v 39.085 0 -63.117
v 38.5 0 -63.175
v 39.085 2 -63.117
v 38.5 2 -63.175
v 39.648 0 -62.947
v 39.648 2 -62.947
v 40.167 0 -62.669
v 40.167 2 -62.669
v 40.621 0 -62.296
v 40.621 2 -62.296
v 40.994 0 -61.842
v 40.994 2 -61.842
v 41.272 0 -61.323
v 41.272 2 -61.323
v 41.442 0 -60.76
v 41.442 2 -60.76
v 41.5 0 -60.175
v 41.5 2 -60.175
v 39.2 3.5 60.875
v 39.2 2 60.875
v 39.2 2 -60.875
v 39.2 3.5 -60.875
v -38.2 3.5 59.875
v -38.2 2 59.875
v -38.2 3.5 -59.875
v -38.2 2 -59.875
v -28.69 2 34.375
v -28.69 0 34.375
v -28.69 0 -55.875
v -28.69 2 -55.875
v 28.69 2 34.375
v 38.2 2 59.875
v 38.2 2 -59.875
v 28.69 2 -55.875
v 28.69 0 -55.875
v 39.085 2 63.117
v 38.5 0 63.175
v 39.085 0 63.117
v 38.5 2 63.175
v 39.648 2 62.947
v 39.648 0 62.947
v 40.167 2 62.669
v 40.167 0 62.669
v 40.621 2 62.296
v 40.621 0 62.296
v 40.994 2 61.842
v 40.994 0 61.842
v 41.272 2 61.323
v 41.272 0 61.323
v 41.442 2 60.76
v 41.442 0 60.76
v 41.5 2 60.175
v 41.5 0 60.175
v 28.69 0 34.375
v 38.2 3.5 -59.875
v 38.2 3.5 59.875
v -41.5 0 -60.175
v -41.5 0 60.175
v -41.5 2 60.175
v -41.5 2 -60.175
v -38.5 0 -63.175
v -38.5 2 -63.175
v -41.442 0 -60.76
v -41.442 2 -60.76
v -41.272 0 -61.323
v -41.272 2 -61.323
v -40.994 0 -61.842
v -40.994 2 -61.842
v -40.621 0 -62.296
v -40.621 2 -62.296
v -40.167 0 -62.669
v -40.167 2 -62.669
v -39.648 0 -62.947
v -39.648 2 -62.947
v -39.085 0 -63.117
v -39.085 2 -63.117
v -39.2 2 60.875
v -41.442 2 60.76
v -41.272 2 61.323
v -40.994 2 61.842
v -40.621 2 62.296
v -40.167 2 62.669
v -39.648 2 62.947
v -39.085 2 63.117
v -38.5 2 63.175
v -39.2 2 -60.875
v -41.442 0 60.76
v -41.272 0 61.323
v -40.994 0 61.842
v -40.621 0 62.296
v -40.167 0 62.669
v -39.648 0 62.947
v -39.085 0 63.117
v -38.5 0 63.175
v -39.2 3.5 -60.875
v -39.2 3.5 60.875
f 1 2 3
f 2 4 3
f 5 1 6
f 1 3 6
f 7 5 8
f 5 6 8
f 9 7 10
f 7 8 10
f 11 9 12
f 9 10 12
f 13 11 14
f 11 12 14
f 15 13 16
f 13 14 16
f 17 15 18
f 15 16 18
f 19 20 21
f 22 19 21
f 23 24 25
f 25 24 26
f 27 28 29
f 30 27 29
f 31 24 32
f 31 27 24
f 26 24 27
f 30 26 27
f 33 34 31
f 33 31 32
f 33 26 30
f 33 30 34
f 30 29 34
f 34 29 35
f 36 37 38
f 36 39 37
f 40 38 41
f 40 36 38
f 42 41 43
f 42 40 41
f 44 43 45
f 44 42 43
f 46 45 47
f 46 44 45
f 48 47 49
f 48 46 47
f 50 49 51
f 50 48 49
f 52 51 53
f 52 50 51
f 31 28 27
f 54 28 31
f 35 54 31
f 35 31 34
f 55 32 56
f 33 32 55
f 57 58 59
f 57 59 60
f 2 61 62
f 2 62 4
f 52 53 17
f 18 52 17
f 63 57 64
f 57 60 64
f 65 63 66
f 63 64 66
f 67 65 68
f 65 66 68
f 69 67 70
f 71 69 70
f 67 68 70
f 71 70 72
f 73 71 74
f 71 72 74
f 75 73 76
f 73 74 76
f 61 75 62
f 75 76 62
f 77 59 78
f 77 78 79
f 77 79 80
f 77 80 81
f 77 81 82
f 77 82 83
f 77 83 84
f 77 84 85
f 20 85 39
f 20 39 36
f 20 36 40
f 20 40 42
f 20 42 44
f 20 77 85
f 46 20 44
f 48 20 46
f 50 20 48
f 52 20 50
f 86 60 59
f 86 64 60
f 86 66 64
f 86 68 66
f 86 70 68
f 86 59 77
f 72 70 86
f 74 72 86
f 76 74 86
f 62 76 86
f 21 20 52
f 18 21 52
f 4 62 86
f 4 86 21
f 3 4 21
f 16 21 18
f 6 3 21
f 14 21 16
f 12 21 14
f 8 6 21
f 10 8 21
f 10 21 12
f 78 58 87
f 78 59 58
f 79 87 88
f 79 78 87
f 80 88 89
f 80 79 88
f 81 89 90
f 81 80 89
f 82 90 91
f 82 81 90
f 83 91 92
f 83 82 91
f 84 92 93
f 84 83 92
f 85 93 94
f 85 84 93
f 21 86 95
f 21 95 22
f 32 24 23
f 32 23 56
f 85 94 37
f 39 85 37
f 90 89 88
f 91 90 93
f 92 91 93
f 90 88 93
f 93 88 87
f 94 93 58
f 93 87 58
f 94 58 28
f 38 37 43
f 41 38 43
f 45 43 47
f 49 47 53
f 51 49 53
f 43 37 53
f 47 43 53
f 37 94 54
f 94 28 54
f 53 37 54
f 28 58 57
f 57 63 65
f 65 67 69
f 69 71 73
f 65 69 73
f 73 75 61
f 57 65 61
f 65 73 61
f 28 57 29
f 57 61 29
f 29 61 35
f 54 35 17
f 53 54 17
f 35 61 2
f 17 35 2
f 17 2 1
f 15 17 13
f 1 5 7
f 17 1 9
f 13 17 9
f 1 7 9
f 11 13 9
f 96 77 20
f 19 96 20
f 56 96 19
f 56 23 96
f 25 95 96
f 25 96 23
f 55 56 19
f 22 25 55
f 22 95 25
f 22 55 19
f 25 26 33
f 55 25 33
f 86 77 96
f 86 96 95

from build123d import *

# Parameters (mm, degrees)
SKETCH1_W           = 83
SKETCH1_H           = 126.35
SKETCH1_W_2         = 57.38
SKETCH1_H_2         = 90.25
BOSS_EXTRUDE1_DEPTH = 2
SKETCH2_W           = 78.4
SKETCH2_H           = 121.75
SKETCH2_W_2         = 76.4
SKETCH2_H_2         = 119.75
BOSS_EXTRUDE2_DEPTH = 1.5
FILLET1_R           = 3


with BuildPart() as part:
    # Sketch1 → Boss-Extrude1 (new body)
    with BuildSketch(Plane(origin=(0, 0, 0), x_dir=(1, 0, 0), z_dir=(0, 1, 0))):
        Rectangle(SKETCH1_W, SKETCH1_H)
        with Locations((0, 10.75)):
            Rectangle(SKETCH1_W_2, SKETCH1_H_2, mode=Mode.SUBTRACT)
    extrude(amount=BOSS_EXTRUDE1_DEPTH)

    # Sketch2 → Boss-Extrude2 (add)
    with BuildSketch(Plane(origin=(0, 2, 0), x_dir=(1, 0, 0), z_dir=(0, 1, 0))):
        Rectangle(SKETCH2_W, SKETCH2_H)
        Rectangle(SKETCH2_W_2, SKETCH2_H_2, mode=Mode.SUBTRACT)
    extrude(amount=BOSS_EXTRUDE2_DEPTH)

    # Fillet1
    fillet1_edges = [part.edges().sort_by_distance(p)[0] for p in [
        (-41.5, 1, -63.175),
        (41.5, 1, -63.175),
        (41.5, 1, 63.175),
        (-41.5, 1, 63.175),
    ]]
    fillet(fillet1_edges, radius=FILLET1_R)


solid = part.part
